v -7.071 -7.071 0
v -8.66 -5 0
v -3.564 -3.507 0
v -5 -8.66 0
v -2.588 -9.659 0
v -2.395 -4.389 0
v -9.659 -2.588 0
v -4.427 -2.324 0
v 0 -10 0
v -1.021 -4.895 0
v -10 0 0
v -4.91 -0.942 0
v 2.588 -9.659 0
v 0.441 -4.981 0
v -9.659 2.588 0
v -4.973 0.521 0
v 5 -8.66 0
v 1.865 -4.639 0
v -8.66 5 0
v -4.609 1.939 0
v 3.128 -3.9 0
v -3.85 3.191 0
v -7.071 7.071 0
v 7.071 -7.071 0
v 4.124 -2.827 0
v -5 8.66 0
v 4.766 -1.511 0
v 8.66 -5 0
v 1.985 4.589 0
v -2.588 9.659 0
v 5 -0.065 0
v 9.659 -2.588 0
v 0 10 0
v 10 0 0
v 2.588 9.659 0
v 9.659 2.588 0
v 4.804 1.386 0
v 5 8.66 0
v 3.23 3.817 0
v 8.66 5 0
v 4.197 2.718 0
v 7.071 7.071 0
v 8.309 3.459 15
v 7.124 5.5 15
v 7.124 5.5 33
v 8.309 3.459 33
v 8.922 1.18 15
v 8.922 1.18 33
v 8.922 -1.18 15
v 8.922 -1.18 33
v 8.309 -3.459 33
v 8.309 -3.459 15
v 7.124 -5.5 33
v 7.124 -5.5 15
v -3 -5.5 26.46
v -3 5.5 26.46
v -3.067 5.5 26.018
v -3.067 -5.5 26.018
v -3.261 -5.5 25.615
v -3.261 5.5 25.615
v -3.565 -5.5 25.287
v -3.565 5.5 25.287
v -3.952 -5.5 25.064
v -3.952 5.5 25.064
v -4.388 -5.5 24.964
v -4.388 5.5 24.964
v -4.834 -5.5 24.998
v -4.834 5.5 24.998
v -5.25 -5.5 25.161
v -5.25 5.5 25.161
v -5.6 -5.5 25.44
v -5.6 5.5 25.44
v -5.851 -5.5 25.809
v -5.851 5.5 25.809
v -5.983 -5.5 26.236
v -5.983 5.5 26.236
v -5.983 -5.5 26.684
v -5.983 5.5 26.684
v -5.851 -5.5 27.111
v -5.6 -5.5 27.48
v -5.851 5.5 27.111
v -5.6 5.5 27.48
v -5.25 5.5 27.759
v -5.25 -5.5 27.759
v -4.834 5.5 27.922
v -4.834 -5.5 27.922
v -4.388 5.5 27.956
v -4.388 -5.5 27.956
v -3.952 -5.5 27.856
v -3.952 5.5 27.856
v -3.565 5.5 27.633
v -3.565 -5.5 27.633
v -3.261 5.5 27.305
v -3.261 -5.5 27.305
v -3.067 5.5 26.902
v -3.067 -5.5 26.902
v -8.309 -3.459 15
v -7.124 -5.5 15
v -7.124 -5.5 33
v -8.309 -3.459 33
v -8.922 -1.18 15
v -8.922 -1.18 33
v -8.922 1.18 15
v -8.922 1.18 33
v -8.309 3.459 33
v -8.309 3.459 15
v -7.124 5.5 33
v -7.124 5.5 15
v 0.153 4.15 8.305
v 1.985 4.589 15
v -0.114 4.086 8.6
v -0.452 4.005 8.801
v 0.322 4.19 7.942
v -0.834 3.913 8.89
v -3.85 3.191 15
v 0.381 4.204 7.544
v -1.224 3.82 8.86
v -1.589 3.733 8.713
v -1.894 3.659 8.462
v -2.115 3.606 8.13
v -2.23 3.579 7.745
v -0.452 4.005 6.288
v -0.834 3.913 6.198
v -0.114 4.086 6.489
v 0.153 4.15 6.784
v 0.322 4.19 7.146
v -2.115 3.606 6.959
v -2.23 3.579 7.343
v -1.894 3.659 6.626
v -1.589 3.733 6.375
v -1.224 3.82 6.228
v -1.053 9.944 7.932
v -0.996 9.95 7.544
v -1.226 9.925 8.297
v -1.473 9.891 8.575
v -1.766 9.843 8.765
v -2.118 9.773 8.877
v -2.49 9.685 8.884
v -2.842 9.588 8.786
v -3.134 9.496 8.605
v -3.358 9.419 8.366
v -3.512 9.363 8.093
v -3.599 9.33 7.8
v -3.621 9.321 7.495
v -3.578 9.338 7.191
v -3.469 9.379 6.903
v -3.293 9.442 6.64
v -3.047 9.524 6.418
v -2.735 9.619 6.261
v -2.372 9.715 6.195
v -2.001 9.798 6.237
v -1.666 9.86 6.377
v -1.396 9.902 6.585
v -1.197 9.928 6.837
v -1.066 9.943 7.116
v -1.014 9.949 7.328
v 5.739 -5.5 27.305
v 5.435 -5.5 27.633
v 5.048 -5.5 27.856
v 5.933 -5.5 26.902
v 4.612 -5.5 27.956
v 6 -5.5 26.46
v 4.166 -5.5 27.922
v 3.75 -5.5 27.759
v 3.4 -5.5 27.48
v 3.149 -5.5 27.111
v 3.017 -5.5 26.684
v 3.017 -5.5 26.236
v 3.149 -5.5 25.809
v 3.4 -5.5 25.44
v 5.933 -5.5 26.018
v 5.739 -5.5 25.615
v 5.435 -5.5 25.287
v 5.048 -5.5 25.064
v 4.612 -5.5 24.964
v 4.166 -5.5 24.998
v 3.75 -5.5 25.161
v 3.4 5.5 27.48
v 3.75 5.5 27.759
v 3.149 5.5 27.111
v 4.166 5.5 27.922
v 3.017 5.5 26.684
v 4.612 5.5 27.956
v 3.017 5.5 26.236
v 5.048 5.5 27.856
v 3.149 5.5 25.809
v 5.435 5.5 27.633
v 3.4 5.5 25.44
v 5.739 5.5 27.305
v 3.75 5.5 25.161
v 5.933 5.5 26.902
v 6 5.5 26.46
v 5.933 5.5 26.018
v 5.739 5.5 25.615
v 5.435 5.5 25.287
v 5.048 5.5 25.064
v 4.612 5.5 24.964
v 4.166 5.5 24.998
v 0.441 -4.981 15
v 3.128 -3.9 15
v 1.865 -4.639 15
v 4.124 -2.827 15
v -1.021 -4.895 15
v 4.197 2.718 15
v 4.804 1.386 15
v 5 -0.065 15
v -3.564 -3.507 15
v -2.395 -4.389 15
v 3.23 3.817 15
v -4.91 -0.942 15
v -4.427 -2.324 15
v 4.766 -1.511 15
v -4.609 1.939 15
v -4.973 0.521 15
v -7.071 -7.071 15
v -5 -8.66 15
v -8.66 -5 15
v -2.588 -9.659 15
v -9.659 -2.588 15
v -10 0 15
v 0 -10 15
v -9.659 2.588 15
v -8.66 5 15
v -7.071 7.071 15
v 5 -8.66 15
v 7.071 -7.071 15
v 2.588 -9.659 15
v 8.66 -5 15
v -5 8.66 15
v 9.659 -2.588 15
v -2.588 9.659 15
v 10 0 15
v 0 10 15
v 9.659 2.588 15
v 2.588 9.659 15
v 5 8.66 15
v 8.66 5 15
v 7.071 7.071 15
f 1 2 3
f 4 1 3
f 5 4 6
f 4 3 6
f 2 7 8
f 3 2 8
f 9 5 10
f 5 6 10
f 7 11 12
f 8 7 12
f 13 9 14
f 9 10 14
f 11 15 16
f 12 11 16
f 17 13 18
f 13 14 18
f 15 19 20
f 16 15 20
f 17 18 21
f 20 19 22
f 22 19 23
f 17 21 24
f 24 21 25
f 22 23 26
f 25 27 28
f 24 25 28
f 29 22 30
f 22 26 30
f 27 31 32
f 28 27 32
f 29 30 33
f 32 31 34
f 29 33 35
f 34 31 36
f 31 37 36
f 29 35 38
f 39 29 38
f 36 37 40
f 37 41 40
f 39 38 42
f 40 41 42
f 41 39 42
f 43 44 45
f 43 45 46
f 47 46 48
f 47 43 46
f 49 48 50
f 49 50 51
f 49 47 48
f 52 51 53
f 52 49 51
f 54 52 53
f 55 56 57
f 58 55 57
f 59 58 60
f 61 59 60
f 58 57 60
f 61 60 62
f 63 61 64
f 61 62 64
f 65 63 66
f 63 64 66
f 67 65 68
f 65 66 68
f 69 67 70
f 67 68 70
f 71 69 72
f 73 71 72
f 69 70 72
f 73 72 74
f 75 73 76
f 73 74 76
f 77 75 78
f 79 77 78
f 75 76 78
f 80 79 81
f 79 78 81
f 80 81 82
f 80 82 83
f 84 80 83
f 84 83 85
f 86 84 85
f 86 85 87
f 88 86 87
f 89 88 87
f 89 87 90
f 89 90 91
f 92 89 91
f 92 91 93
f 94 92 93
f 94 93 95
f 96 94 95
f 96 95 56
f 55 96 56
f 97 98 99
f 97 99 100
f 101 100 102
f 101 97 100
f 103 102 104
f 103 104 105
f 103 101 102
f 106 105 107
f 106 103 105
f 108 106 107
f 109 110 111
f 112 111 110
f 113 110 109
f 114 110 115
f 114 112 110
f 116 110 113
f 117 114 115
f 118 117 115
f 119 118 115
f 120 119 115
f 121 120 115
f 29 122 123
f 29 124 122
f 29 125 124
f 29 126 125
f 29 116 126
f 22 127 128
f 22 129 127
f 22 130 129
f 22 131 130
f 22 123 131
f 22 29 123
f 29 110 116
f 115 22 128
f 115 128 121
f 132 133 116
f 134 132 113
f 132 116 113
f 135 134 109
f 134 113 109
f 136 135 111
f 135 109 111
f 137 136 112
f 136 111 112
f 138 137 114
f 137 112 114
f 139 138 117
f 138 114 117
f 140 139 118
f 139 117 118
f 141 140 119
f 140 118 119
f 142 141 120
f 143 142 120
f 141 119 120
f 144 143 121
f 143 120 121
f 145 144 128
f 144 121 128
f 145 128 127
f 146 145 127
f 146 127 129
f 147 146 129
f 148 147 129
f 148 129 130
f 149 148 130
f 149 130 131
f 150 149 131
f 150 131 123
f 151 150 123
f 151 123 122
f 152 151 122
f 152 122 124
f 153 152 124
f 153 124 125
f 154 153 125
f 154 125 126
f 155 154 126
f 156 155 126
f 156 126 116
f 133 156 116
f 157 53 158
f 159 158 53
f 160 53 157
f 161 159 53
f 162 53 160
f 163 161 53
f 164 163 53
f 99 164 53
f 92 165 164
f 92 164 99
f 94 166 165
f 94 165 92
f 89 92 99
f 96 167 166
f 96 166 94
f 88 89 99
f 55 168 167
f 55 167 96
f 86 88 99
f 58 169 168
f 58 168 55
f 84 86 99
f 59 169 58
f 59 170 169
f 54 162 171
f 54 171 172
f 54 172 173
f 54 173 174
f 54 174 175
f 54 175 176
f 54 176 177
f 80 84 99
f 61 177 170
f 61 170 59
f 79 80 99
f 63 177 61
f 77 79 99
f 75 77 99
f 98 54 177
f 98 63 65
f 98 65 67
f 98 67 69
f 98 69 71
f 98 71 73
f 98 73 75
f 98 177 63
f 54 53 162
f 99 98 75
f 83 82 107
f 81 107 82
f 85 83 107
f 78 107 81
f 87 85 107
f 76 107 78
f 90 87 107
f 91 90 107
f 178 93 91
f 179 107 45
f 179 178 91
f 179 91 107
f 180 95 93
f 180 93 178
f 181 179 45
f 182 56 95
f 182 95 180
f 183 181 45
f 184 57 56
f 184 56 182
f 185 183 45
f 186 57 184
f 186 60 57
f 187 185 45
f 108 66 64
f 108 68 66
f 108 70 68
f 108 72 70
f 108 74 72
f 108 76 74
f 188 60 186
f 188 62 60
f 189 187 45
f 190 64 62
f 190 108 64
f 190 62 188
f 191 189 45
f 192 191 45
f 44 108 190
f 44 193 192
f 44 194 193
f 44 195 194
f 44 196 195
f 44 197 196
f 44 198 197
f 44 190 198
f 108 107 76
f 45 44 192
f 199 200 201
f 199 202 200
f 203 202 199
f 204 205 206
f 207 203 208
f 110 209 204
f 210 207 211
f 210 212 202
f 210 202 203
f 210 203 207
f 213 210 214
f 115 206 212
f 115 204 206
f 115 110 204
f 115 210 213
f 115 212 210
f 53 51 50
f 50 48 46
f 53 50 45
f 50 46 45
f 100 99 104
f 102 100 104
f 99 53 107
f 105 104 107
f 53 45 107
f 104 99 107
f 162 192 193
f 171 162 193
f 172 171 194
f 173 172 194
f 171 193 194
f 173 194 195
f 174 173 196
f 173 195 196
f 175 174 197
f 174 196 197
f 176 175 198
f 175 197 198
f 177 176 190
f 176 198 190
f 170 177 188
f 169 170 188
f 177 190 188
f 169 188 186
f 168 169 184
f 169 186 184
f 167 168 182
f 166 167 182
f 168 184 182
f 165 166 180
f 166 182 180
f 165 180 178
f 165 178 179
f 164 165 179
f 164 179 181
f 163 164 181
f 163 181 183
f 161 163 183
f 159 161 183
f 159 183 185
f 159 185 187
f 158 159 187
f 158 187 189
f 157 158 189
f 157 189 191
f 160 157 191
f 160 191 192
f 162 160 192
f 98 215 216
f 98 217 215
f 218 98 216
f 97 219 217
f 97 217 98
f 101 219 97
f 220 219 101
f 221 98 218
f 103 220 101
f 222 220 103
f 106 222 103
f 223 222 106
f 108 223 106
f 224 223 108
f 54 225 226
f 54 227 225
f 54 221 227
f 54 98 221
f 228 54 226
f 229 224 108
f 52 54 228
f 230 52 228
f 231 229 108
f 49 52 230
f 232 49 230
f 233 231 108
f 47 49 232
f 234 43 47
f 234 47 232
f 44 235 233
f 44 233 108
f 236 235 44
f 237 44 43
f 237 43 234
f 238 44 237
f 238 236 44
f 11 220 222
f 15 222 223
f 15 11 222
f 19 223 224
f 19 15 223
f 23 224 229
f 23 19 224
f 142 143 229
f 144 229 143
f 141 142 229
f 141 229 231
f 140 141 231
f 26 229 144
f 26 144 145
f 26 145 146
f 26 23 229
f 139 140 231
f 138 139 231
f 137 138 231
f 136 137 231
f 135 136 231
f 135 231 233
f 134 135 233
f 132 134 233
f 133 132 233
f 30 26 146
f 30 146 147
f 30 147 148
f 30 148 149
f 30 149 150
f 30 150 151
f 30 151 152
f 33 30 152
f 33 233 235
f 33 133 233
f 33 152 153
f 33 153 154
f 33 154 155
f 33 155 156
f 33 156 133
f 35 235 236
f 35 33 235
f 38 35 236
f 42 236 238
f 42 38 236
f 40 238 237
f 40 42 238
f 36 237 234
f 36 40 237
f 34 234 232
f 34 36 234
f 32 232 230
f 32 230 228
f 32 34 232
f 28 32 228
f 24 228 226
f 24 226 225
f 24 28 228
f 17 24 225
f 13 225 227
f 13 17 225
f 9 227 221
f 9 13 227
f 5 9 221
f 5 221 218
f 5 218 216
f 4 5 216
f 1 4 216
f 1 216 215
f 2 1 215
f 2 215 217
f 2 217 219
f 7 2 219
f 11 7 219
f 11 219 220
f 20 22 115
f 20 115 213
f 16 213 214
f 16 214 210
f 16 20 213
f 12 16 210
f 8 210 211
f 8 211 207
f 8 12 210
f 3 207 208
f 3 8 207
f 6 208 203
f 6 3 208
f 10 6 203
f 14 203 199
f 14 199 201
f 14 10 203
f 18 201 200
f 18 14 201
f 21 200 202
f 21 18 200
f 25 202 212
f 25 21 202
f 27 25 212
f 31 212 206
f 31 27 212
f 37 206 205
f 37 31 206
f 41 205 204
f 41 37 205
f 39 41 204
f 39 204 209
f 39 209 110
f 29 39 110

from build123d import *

# Parameters (mm, degrees)
SKETCH_1_R          = 5.25
EXTRUDE_1_DEPTH     = 15
CUT_EXTRUDE_1_DEPTH = 10
EXTRUDE_2_DEPTH     = 18
SKETCH_4_R          = 1.5
CUT_EXTRUDE_2_DEPTH = 14.5
SKETCH_5_R          = 14
SKETCH_5_R_2        = 5.25
EXTRUDE_3_DEPTH     = 15
SKETCH_6_R          = 18.043638251
SKETCH_6_R_2        = 10
CUT_EXTRUDE_3_DEPTH = 15
SKETCH_7_R          = 6.986522344
EXTRUDE_4_DEPTH     = 15
SKETCH_8_R          = 1.35
CUT_EXTRUDE_4_DEPTH = 15


with BuildPart() as part:
    # 草图1 → 凸台-拉伸1 (new body)
    with BuildSketch(Plane.XY):
        with BuildLine():
            Line((-11.489125293, -8), (11.489125293, -8))
            ThreePointArc((11.489125293, -8), (0, 14), (-11.489125293, -8))
        make_face()
        Circle(SKETCH_1_R, mode=Mode.SUBTRACT)
    extrude(amount=EXTRUDE_1_DEPTH)

    # 草图2 → 切除-拉伸1 (cut)
    with BuildSketch(Plane.XY.offset(15)):
        with BuildLine():
            Line((-13.416407865, 4), (13.416407865, 4))
            ThreePointArc((13.416407865, 4), (0, 14), (-13.416407865, 4))
        make_face()
    extrude(amount=-CUT_EXTRUDE_1_DEPTH, mode=Mode.SUBTRACT)

    # 草图3 → 凸台-拉伸2 (add)
    with BuildSketch(Plane.XY.offset(15)):
        with BuildLine():
            Line((-7.123903424, 5.5), (7.123903424, 5.5))
            ThreePointArc((7.123903424, 5.5), (9, 0), (7.123903424, -5.5))
            Line((7.123903424, -5.5), (-7.123903424, -5.5))
            ThreePointArc((-7.123903424, -5.5), (-9, 0), (-7.123903424, 5.5))
        make_face()
    extrude(amount=EXTRUDE_2_DEPTH)

    # 草图4 → 切除-拉伸2 (cut, through all)
    with BuildSketch(Plane(origin=(0, 5.5, 0), x_dir=(1, 0, 0), z_dir=(0, 1, 0))):
        with Locations((4.5, -26.46)):
            Circle(SKETCH_4_R)
        with Locations((-4.5, -26.46)):
            Circle(SKETCH_4_R)
    extrude(amount=-CUT_EXTRUDE_2_DEPTH, mode=Mode.SUBTRACT)

    # 草图5 → 凸台-拉伸3 (add)
    with BuildSketch(Plane(origin=(0, 0, 0), x_dir=(-1, 0, 0), z_dir=(0, 0, -1))):
        Circle(SKETCH_5_R)
        Circle(SKETCH_5_R_2, mode=Mode.SUBTRACT)
    extrude(amount=-EXTRUDE_3_DEPTH)

    # 草图6 → 切除-拉伸3 (cut)
    with BuildSketch(Plane(origin=(0, 0, 0), x_dir=(-1, 0, 0), z_dir=(0, 0, -1))):
        Circle(SKETCH_6_R)
        Circle(SKETCH_6_R_2, mode=Mode.SUBTRACT)
    extrude(amount=-CUT_EXTRUDE_3_DEPTH, mode=Mode.SUBTRACT)

    # 草图7 → 凸台-拉伸4 (add)
    with BuildSketch(Plane(origin=(0, 0, 0), x_dir=(-1, 0, 0), z_dir=(0, 0, -1))):
        Circle(SKETCH_7_R)
        with BuildLine():
            Line((-1.985312345, 4.588957931), (3.849512157, 3.190808072))
            ThreePointArc((3.849512157, 3.190808072), (-1.165124883, -4.862353752), (-1.985312345, 4.588957931))
        make_face(mode=Mode.SUBTRACT)
    extrude(amount=-EXTRUDE_4_DEPTH)

    # 草图8 → 切除-拉伸4 (cut)
    with BuildSketch(Plane(origin=(-0.932099906, 3.889883001, 0), x_dir=(0.97247075, 0.233024977, 0), z_dir=(0.233024977, -0.97247075, 0))):
        with Locations((0, 7.544256547)):
            Circle(SKETCH_8_R)
    extrude(amount=-CUT_EXTRUDE_4_DEPTH, mode=Mode.SUBTRACT)


solid = part.part
